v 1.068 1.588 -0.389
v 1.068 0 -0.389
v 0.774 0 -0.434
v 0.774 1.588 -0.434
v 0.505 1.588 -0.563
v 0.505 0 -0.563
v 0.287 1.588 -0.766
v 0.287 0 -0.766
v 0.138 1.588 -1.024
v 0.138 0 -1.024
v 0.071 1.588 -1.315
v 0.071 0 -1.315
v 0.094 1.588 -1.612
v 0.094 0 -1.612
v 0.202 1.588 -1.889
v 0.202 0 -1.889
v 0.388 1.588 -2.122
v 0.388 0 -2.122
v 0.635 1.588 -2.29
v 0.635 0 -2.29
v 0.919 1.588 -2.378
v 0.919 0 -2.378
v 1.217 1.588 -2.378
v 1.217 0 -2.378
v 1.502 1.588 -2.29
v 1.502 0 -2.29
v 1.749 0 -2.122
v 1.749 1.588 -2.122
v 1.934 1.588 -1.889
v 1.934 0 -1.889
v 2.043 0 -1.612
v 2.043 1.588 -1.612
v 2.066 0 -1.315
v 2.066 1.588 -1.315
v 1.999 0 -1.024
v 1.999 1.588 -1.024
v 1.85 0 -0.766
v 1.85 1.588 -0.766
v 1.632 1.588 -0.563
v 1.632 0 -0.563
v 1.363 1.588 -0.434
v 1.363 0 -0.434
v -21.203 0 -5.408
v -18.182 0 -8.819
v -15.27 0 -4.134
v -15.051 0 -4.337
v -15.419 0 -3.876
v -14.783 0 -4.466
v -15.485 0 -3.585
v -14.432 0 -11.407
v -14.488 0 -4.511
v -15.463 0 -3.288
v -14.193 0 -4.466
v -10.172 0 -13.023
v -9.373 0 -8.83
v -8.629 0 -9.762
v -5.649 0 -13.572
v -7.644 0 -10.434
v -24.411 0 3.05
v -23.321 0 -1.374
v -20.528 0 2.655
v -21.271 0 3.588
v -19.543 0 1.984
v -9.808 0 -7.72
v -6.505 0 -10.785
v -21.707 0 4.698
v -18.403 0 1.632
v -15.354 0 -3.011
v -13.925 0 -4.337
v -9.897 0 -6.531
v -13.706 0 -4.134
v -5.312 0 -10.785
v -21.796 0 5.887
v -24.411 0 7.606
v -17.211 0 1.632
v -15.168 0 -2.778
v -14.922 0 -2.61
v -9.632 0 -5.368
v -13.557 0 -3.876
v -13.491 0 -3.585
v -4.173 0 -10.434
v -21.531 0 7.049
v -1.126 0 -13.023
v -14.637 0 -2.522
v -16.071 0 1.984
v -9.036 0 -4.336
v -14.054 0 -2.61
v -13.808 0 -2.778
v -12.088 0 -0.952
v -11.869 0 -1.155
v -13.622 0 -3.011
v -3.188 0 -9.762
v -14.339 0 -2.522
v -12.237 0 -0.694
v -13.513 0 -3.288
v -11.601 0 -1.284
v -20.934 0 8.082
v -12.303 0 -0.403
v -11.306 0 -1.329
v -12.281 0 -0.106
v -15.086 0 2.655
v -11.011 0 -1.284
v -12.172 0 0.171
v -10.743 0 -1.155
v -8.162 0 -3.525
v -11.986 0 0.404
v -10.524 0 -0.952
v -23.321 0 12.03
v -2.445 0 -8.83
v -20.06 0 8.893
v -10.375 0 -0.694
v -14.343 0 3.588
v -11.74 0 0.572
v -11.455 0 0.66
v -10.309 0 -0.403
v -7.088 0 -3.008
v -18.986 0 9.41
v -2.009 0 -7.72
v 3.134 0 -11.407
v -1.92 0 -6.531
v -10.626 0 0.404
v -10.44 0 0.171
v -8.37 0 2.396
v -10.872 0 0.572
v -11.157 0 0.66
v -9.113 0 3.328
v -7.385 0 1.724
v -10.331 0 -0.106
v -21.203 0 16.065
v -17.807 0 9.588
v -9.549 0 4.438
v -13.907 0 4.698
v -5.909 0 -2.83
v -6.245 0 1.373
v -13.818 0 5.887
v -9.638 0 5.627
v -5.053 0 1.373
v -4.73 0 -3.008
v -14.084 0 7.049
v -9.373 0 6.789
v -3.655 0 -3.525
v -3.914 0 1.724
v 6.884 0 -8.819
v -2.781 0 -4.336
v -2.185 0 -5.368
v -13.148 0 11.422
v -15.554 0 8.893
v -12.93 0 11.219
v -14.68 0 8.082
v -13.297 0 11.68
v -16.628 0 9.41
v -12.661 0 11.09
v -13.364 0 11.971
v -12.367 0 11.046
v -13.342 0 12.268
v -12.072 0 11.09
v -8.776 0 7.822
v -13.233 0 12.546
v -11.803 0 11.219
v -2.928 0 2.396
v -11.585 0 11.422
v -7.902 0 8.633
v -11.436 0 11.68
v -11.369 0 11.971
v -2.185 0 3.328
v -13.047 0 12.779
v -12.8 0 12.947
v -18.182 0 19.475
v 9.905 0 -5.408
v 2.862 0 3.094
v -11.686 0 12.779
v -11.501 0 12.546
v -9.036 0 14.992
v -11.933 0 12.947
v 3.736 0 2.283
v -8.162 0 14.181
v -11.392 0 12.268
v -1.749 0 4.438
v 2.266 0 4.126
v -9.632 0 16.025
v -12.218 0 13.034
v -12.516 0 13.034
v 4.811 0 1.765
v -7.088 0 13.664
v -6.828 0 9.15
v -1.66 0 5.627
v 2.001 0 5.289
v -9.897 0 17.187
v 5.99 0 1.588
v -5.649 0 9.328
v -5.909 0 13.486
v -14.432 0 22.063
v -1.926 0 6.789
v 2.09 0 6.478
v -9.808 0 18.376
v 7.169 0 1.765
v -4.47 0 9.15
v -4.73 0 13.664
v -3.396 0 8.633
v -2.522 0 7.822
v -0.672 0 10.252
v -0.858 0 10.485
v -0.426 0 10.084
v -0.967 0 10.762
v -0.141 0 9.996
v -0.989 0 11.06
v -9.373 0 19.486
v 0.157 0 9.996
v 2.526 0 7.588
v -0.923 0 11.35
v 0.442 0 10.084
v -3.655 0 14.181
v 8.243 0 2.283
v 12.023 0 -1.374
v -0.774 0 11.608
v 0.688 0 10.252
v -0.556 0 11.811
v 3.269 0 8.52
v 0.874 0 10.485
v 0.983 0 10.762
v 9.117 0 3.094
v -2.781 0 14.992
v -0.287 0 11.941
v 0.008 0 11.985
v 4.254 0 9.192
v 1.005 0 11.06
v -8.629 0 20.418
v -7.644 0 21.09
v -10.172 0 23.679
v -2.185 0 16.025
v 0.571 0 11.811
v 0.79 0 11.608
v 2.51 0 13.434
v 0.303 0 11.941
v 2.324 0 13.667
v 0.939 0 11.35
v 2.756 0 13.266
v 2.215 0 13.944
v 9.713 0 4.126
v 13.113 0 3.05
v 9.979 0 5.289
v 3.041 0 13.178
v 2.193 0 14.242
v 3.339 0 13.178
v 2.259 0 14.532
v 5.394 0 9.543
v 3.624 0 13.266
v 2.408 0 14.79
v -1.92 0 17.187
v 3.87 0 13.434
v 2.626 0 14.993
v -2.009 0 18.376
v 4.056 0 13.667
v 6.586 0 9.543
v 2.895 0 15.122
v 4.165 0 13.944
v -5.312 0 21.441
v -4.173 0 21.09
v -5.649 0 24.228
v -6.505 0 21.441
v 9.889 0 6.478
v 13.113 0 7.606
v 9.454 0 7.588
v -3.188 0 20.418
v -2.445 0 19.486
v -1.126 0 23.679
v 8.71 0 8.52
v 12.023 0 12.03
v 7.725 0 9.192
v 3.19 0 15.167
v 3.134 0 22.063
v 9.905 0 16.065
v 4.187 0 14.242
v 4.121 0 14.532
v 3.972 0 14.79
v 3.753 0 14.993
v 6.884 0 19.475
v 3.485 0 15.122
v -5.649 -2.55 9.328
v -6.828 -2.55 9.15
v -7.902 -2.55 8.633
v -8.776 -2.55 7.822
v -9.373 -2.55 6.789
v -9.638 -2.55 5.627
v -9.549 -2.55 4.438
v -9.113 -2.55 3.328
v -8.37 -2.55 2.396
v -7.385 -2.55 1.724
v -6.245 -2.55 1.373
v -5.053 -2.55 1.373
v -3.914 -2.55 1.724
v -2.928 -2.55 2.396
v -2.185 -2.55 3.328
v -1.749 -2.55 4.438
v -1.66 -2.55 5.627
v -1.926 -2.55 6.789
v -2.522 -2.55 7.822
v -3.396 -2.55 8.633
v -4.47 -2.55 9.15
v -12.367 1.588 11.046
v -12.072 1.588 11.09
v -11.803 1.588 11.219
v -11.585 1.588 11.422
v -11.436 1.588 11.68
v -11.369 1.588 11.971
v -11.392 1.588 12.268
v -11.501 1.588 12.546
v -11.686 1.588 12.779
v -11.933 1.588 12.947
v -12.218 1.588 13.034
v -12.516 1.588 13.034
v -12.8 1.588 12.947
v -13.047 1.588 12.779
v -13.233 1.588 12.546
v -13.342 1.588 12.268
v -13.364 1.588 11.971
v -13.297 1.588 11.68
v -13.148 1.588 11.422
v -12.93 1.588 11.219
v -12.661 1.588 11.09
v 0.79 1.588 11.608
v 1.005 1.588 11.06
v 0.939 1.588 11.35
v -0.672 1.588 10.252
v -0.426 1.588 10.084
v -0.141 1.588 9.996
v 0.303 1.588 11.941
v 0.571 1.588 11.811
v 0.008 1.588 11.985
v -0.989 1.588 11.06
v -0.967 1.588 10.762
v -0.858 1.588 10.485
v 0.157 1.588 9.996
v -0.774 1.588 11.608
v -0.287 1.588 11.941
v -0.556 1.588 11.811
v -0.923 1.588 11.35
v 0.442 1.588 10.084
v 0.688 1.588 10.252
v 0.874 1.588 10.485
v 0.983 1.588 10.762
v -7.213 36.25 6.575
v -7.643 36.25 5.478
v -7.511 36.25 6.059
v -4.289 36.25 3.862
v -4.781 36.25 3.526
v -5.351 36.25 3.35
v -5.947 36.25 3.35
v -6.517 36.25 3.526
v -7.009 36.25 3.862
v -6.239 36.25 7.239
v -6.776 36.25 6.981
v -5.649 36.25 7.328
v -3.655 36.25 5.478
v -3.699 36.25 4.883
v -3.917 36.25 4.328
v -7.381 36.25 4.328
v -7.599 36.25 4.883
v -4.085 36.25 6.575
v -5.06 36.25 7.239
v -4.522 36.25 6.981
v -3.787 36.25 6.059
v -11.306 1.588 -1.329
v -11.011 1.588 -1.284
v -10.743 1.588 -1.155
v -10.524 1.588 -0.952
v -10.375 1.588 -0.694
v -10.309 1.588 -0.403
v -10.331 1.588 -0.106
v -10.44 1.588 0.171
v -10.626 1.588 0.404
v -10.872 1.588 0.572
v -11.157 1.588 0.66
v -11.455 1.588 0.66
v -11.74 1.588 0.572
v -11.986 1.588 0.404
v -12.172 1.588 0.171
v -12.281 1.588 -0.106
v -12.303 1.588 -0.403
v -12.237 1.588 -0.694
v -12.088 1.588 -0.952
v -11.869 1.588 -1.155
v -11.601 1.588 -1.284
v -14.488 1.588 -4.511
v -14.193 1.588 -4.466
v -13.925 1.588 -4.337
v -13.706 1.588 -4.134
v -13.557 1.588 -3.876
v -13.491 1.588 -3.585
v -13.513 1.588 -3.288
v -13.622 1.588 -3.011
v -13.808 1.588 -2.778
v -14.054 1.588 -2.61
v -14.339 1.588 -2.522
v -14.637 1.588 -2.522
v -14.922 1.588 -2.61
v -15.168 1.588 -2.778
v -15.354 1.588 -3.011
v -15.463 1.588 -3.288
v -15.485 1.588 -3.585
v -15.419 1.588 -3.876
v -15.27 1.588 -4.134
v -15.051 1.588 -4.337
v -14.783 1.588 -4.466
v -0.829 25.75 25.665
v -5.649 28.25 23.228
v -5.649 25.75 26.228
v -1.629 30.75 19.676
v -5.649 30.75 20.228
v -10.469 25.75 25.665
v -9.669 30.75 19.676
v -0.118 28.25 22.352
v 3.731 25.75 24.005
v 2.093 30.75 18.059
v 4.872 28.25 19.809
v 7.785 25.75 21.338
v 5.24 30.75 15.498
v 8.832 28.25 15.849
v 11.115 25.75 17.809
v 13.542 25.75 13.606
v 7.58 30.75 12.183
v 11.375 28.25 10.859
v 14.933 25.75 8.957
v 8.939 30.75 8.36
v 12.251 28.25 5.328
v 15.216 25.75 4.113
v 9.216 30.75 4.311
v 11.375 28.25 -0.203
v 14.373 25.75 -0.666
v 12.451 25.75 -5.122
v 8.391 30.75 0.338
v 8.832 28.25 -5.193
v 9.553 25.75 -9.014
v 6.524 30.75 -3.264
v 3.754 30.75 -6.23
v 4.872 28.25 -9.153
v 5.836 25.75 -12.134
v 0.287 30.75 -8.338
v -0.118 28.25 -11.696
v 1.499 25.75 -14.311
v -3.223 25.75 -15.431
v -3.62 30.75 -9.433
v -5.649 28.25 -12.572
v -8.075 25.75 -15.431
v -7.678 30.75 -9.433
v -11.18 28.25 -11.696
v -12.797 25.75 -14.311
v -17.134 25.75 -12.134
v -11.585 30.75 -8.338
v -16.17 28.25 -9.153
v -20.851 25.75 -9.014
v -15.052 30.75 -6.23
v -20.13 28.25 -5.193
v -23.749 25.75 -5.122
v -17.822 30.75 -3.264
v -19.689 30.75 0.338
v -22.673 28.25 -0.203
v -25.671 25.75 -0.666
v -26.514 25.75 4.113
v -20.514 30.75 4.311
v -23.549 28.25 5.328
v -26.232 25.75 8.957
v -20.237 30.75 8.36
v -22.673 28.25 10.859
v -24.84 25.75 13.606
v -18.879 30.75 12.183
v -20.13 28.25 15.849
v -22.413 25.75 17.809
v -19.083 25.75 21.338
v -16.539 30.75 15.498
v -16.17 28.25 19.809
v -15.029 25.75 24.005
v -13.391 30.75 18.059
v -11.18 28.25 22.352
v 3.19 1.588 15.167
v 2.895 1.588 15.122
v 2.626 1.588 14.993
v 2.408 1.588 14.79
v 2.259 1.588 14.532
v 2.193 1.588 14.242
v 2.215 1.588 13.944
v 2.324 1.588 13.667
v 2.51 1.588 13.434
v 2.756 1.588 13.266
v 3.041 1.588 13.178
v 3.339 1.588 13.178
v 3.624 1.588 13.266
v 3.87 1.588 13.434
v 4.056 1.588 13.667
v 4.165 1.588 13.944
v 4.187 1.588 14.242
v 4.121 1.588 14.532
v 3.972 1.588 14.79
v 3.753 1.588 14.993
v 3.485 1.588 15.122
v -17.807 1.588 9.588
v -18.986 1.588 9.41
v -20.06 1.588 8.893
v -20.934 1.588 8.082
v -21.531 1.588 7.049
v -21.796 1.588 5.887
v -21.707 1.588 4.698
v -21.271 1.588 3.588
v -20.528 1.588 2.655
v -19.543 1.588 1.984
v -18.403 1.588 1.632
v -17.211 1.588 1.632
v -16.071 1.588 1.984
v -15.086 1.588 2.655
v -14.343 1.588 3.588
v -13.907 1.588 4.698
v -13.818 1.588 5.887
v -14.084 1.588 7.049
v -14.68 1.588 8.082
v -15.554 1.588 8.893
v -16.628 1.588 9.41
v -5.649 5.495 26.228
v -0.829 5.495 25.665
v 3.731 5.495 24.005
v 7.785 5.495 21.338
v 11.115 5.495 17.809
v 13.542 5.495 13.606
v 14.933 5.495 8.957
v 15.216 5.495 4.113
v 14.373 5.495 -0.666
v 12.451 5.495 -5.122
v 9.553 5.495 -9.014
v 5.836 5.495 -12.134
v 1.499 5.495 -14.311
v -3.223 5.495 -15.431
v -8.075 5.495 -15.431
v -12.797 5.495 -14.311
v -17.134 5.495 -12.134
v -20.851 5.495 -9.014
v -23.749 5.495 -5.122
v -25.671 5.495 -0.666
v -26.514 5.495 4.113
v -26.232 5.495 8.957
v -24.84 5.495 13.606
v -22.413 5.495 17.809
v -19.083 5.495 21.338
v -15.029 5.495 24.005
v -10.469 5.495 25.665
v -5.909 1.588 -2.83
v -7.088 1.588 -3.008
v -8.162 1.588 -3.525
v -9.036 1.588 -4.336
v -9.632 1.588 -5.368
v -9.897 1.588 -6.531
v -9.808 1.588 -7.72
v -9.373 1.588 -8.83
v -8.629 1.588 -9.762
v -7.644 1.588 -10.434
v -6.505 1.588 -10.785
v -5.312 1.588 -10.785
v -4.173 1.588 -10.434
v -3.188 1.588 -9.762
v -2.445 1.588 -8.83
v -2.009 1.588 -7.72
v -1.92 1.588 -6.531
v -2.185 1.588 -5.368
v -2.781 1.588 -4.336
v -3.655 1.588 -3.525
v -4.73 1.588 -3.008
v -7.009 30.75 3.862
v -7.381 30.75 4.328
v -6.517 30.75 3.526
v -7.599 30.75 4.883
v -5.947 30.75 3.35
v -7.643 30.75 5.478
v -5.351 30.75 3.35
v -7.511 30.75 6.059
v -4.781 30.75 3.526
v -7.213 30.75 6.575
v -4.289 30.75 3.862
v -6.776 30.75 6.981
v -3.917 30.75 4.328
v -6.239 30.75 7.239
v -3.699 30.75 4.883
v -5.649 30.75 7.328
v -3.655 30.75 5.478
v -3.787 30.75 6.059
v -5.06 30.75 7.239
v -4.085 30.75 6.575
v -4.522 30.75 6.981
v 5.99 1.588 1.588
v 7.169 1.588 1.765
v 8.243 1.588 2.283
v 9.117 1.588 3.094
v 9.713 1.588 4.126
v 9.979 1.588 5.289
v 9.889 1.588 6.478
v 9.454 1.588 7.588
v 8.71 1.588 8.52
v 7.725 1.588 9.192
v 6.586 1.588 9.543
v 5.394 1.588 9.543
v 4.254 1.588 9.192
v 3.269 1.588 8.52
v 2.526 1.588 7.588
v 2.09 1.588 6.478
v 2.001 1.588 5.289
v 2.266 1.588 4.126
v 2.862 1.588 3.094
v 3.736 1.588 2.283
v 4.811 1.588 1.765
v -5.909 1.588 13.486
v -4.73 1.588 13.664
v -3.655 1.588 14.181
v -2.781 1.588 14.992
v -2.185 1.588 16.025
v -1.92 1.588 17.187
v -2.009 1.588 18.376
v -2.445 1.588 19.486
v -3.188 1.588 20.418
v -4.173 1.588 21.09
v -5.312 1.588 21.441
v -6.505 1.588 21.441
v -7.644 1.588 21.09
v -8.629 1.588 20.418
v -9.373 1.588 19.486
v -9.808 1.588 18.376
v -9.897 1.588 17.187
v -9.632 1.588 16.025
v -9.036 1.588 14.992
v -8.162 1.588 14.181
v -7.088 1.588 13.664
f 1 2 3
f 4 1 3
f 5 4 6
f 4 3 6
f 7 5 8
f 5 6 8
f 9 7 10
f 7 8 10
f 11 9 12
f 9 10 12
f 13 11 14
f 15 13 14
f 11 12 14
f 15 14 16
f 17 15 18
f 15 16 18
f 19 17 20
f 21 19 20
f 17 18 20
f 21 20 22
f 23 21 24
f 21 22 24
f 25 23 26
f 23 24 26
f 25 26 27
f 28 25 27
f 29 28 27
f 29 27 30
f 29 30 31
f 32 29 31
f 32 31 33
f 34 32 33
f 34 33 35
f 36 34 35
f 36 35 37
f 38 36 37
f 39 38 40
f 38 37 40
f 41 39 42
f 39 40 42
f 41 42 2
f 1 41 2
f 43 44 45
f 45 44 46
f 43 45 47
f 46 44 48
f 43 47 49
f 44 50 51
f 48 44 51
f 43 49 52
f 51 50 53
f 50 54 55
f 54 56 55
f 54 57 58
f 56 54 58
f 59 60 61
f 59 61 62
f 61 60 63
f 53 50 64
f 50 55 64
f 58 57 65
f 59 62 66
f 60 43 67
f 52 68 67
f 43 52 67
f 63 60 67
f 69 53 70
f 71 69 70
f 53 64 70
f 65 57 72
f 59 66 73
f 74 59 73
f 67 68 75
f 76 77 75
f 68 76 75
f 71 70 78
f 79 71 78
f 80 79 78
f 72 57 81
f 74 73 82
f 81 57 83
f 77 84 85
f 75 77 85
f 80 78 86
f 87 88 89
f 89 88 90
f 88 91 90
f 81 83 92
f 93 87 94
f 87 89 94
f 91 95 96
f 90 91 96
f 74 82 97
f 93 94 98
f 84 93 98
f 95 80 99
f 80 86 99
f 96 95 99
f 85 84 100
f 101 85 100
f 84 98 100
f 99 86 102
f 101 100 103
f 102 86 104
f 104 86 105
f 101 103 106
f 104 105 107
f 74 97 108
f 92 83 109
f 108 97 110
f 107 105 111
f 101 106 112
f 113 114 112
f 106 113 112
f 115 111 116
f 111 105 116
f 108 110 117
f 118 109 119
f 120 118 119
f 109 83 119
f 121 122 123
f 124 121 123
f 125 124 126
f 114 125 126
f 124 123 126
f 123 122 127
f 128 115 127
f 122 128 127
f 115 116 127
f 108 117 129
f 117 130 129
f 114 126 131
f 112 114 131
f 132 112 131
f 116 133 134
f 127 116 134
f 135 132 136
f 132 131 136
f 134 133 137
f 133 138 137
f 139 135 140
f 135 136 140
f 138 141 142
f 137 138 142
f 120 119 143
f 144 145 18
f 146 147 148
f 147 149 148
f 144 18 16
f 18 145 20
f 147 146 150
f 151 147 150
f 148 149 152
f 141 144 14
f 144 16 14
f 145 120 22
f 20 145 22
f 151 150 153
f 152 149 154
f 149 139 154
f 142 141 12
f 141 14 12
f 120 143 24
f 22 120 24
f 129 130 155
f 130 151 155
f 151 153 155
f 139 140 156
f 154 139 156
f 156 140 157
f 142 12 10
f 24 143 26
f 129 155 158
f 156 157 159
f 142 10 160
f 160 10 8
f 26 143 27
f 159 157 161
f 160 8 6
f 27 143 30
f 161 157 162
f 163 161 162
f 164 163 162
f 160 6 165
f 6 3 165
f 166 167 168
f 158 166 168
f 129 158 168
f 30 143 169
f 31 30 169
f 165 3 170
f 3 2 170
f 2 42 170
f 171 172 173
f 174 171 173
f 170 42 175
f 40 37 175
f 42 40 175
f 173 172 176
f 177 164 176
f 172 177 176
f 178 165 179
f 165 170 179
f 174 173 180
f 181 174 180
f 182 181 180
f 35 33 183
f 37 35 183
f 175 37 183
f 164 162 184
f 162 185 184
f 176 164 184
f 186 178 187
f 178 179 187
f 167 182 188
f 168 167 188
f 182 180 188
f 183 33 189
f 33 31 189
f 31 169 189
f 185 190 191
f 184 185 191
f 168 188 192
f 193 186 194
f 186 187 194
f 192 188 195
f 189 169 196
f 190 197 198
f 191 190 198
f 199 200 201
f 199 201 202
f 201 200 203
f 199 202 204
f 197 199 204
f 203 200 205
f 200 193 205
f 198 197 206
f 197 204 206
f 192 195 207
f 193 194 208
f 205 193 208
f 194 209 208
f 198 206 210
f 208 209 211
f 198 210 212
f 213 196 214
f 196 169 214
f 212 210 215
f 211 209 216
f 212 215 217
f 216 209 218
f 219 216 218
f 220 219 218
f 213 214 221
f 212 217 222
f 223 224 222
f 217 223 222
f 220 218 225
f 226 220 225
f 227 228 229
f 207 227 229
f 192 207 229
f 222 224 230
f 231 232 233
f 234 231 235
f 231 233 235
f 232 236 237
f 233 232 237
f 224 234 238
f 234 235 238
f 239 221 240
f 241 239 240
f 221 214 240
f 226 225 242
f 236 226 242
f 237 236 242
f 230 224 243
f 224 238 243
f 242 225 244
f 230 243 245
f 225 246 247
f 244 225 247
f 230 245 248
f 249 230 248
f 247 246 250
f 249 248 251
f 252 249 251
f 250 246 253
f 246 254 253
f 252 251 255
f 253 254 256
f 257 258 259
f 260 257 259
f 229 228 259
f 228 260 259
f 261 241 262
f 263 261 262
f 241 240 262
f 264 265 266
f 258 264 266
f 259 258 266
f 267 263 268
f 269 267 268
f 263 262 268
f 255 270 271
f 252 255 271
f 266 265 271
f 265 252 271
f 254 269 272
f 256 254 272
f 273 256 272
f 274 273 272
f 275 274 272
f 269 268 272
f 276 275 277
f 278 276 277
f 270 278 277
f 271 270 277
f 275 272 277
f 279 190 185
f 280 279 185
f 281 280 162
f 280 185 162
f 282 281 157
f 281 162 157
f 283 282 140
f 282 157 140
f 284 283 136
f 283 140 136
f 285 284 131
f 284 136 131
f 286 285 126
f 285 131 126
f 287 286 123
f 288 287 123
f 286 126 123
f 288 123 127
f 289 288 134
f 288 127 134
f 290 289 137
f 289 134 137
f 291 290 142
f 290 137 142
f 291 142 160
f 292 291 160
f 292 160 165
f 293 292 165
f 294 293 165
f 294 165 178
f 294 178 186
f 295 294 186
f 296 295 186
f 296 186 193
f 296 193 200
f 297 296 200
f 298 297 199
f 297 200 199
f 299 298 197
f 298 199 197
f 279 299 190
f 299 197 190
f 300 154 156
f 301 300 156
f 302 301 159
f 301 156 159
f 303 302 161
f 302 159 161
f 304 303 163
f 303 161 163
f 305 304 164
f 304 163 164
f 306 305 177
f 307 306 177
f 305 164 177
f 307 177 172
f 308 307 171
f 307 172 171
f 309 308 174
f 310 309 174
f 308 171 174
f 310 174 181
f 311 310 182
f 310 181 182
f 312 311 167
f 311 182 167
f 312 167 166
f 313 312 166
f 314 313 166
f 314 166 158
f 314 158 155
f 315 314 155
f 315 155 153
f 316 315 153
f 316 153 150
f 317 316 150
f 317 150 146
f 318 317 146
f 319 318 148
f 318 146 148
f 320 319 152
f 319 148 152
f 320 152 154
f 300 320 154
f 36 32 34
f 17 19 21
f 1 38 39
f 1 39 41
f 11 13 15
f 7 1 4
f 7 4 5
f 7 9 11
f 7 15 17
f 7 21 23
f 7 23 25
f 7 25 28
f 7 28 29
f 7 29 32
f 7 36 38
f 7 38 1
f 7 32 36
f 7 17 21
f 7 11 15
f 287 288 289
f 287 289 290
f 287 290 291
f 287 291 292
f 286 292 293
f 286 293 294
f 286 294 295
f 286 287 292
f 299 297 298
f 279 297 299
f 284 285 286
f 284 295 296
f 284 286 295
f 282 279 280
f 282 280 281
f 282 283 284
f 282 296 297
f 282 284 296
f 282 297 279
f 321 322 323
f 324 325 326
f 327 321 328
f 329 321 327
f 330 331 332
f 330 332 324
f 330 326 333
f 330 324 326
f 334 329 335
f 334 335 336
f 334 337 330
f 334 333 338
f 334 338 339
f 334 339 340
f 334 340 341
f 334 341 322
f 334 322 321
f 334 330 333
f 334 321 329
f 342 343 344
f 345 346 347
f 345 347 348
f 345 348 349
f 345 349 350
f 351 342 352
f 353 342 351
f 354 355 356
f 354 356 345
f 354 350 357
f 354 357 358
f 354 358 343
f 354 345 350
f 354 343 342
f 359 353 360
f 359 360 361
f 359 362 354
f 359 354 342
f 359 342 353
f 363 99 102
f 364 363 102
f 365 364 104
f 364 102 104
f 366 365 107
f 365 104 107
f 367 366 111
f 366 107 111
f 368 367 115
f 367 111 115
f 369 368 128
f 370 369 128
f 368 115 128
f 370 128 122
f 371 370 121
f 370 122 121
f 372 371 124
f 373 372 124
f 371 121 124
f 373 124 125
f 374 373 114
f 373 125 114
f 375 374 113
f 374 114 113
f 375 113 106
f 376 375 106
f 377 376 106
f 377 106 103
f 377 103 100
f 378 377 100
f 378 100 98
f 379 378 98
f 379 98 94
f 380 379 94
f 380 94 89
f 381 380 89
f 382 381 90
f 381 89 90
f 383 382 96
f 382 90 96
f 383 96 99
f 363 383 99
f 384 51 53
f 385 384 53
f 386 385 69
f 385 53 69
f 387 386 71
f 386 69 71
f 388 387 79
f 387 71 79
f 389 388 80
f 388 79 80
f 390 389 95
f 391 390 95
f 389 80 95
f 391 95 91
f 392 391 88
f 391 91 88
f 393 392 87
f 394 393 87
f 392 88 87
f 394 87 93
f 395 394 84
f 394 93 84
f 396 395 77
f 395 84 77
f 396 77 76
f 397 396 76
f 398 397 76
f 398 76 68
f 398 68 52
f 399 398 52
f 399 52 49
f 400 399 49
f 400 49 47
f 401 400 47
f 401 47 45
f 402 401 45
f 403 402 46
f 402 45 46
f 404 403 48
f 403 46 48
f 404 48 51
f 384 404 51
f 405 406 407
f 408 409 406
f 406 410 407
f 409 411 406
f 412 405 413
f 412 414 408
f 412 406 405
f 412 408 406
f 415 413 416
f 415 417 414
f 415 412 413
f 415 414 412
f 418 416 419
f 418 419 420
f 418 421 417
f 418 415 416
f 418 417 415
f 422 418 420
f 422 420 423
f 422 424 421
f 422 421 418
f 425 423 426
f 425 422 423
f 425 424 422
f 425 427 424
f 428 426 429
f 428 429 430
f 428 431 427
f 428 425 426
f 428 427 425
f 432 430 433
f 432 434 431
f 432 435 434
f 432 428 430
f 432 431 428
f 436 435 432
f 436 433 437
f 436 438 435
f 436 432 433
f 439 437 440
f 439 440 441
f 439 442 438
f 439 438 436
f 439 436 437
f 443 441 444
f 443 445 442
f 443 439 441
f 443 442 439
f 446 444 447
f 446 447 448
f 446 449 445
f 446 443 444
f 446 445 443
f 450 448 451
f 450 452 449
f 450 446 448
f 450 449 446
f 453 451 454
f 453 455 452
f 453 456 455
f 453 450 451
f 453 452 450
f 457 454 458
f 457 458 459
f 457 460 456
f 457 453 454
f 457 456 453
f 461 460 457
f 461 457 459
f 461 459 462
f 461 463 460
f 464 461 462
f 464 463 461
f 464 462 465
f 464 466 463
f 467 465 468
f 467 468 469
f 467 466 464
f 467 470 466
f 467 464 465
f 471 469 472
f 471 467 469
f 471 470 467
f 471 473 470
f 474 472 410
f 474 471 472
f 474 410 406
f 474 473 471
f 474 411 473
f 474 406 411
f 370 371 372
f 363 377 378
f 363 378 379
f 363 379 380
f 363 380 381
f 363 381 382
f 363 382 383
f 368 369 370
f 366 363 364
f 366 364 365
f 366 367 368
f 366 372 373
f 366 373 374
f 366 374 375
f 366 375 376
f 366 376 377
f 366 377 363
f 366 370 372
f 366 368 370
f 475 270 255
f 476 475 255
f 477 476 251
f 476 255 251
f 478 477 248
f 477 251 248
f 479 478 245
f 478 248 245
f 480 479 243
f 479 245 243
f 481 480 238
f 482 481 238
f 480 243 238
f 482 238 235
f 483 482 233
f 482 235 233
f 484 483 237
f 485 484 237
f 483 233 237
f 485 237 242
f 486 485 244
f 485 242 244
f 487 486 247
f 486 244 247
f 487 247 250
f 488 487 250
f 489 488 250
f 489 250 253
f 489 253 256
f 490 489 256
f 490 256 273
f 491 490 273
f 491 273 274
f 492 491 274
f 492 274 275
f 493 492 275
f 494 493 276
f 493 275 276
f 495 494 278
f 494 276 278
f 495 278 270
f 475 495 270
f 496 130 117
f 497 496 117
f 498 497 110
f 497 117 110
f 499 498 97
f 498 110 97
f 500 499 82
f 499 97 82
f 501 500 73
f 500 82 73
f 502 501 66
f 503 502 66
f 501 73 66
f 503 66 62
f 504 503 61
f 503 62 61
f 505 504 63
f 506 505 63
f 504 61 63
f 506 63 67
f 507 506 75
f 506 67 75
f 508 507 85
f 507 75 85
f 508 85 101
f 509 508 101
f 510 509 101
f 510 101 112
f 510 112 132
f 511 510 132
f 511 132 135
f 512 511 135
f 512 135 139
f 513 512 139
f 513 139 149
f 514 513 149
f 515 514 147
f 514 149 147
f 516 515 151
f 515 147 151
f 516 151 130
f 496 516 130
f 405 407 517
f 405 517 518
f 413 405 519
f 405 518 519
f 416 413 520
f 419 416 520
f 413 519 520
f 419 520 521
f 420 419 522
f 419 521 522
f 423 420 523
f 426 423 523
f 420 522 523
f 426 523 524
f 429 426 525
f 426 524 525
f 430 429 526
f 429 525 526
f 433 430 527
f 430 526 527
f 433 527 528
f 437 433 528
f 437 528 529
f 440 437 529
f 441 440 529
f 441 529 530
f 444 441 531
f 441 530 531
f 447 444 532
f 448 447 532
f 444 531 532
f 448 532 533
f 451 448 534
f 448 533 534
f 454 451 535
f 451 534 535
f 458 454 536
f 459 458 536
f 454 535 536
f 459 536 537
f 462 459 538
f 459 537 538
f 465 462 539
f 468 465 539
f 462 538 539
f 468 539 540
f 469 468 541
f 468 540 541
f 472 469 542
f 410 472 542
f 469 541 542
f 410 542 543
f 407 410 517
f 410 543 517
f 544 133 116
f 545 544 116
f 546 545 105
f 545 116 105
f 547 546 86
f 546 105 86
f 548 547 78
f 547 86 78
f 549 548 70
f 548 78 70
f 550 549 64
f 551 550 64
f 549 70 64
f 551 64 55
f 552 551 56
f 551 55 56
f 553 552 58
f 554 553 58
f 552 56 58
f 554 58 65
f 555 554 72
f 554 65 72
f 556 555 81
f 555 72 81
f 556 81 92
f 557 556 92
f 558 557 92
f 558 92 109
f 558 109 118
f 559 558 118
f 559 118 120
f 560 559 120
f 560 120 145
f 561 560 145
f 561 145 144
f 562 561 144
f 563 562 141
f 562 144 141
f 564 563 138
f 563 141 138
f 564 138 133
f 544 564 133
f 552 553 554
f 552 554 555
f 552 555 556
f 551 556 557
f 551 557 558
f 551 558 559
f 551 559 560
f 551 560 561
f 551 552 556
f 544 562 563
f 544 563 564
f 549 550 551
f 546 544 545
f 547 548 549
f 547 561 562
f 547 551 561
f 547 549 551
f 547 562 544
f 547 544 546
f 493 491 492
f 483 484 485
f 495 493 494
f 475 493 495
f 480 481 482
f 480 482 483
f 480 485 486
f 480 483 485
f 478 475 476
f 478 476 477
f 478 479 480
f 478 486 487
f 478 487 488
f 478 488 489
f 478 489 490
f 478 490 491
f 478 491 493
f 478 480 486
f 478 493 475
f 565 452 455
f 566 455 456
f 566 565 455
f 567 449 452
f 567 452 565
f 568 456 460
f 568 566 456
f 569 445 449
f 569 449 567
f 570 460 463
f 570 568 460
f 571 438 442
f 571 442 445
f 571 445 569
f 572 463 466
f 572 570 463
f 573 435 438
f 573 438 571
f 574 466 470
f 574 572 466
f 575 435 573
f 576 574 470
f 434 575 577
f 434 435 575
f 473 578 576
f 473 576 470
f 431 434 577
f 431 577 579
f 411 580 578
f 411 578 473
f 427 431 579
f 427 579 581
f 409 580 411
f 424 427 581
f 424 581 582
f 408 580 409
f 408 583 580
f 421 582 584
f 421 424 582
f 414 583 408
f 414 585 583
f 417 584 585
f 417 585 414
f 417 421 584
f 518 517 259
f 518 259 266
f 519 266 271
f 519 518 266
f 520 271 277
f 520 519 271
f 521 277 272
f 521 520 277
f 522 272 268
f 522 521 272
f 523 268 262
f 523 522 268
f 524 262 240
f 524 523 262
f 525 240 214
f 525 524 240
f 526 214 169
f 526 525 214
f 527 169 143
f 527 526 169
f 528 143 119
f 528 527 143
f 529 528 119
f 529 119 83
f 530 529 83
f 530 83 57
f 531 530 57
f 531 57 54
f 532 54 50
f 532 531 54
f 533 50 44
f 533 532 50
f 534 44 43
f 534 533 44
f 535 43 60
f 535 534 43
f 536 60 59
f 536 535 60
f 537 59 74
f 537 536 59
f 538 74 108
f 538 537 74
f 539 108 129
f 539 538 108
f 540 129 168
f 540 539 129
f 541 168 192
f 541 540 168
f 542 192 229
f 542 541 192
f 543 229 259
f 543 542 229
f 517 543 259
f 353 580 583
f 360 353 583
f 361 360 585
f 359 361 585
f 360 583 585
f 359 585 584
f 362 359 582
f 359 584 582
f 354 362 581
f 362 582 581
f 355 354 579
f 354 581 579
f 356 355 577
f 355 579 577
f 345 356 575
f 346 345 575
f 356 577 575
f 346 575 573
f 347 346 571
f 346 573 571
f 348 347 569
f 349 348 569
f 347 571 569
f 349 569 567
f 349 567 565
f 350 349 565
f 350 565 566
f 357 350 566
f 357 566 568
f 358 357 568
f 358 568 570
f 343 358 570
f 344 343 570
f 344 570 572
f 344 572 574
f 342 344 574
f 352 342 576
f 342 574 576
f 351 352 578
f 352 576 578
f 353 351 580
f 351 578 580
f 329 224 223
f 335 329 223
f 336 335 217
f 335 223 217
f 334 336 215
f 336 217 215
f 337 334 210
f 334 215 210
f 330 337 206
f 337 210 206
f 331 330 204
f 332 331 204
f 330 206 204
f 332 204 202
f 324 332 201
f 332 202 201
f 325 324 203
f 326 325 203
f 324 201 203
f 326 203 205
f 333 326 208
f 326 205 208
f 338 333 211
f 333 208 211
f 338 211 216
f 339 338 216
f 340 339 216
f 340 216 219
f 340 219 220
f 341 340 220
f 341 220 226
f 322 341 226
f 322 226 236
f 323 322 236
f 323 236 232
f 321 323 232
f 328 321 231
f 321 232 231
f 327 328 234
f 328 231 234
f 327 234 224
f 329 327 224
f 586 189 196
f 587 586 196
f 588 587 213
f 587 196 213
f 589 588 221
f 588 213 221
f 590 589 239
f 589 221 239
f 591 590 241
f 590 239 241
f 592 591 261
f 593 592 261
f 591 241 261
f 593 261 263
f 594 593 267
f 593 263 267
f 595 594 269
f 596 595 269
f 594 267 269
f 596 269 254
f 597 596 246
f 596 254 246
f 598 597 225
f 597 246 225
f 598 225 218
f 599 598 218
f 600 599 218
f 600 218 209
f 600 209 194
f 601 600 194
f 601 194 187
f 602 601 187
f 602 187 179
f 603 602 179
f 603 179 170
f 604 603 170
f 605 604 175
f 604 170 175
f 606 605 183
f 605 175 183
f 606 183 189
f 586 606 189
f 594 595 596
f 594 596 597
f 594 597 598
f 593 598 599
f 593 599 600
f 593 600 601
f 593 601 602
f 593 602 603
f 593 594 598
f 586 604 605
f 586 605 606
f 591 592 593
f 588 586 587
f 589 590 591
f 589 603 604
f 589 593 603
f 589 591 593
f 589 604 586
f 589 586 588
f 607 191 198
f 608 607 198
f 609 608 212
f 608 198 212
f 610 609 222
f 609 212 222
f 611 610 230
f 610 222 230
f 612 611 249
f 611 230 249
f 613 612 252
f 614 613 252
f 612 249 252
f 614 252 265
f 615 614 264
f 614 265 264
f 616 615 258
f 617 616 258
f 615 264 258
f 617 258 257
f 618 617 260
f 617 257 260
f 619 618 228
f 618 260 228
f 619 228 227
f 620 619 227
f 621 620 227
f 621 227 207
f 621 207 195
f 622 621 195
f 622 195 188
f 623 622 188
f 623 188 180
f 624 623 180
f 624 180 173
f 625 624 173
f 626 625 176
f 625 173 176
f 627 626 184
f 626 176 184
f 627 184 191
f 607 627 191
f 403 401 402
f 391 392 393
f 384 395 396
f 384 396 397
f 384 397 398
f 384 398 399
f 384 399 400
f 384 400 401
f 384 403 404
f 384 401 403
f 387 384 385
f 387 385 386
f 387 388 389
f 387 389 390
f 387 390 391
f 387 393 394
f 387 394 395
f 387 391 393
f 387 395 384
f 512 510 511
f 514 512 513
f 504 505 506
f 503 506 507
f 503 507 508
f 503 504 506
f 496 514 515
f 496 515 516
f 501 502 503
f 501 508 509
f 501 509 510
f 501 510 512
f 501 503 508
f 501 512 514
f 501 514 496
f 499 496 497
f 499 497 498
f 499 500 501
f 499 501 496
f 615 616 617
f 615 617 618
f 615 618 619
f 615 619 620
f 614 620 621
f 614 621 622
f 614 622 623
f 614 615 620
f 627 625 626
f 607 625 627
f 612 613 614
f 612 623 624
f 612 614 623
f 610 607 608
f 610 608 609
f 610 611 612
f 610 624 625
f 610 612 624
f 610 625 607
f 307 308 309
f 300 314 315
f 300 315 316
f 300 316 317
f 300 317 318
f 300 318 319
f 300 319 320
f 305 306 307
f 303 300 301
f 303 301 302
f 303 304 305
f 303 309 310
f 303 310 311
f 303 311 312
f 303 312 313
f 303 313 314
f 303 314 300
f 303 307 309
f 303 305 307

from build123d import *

# Parameters (mm, degrees)
SKETCH1_R           = 20.9
BOSS_EXTRUDE1_DEPTH = 30.75
CHAMFER1_SIZE       = 5
CHAMFER1_SIZE2      = 6
CHAMFER2_SIZE       = 2
CHAMFER2_SIZE2      = 5.494954839
SKETCH2_R           = 2
BOSS_EXTRUDE2_DEPTH = 5.5
SKETCH3_R           = 4
BOSS_EXTRUDE3_DEPTH = 2.55
SKETCH4_R           = 4
SKETCH4_R_2         = 1
CUT_EXTRUDE1_DEPTH  = 1.5875


with BuildPart() as part:
    # Sketch1 → Boss-Extrude1 (new body)
    with BuildSketch(Plane(origin=(0, 0, 0), x_dir=(1, 0, 0), z_dir=(0, 1, 0))):
        with Locations(Location((-5.649057894, -5.328088696, 0), (0, 0, 270))):
            Circle(SKETCH1_R)
    extrude(amount=BOSS_EXTRUDE1_DEPTH)

    # Chamfer1
    chamfer1_edges = [part.edges().sort_by_distance(p)[0] for p in [
        (-5.649057894, 30.75, -15.571911304),
    ]]
    chamfer1_side = [part.faces().sort_by_distance(p)[0] for p in [
        (-5.649057894, 15.375, -15.571911304),
    ]]
    chamfer(chamfer1_edges, length=CHAMFER1_SIZE, length2=CHAMFER1_SIZE2, reference=chamfer1_side[0])

    # Chamfer2
    chamfer2_edges = [part.edges().sort_by_distance(p)[0] for p in [
        (-5.649057894, 0, -15.571911304),
    ]]
    chamfer2_side = [part.faces().sort_by_distance(p)[0] for p in [
        (-5.649057894, 0, 5.328088696),
    ]]
    chamfer(chamfer2_edges, length=CHAMFER2_SIZE, length2=CHAMFER2_SIZE2, reference=chamfer2_side[0])

    # Sketch2 → Boss-Extrude2 (add)
    with BuildSketch(Plane(origin=(0, 30.75, 0), x_dir=(1, 0, 0), z_dir=(0, 1, 0))):
        with Locations(Location((-5.649057894, -5.328088696, 0), (0, 0, 270))):
            Circle(SKETCH2_R)
    extrude(amount=BOSS_EXTRUDE2_DEPTH)

    # Sketch3 → Boss-Extrude3 (add)
    with BuildSketch(Plane.XZ):
        with Locations(Location((-5.649057894, 5.328088696, 0), (0, 0, 90))):
            Circle(SKETCH3_R)
    extrude(amount=BOSS_EXTRUDE3_DEPTH)

    # Sketch4 → Cut-Extrude1 (cut)
    with BuildSketch(Plane.XZ):
        with Locations(Location((-5.908658192, 17.486035989, 0), (0, 0, 270))):
            Circle(SKETCH4_R)
        with Locations(Location((-5.908658192, -6.829858597, 0), (0, 0, 90))):
            Circle(SKETCH4_R)
        with Locations(Location((-17.807005187, 5.587688994, 0), (0, 0, 90))):
            Circle(SKETCH4_R)
        with Locations(Location((5.989688802, 5.587688994, 0), (0, 0, 270))):
            Circle(SKETCH4_R)
        with Locations(Location((-12.366572316, 12.045603117, 0), (0, 0, 270))):
            Circle(SKETCH4_R_2)
        with Locations(Location((1.068456527, -1.389425725, 0), (0, 0, 90))):
            Circle(SKETCH4_R_2)
        with Locations(Location((-11.305912144, -0.328765554, 0), (0, 0, 270))):
            Circle(SKETCH4_R_2)
        with Locations(Location((0.007796355, 10.984942945, 0), (0, 0, 90))):
            Circle(SKETCH4_R_2)
        with Locations(Location((-14.487892659, -3.510746069, 0), (0, 0, 270))):
            Circle(SKETCH4_R_2)
        with Locations(Location((3.18977687, 14.166923461, 0), (0, 0, 90))):
            Circle(SKETCH4_R_2)
    extrude(amount=-CUT_EXTRUDE1_DEPTH, mode=Mode.SUBTRACT)


solid = part.part
